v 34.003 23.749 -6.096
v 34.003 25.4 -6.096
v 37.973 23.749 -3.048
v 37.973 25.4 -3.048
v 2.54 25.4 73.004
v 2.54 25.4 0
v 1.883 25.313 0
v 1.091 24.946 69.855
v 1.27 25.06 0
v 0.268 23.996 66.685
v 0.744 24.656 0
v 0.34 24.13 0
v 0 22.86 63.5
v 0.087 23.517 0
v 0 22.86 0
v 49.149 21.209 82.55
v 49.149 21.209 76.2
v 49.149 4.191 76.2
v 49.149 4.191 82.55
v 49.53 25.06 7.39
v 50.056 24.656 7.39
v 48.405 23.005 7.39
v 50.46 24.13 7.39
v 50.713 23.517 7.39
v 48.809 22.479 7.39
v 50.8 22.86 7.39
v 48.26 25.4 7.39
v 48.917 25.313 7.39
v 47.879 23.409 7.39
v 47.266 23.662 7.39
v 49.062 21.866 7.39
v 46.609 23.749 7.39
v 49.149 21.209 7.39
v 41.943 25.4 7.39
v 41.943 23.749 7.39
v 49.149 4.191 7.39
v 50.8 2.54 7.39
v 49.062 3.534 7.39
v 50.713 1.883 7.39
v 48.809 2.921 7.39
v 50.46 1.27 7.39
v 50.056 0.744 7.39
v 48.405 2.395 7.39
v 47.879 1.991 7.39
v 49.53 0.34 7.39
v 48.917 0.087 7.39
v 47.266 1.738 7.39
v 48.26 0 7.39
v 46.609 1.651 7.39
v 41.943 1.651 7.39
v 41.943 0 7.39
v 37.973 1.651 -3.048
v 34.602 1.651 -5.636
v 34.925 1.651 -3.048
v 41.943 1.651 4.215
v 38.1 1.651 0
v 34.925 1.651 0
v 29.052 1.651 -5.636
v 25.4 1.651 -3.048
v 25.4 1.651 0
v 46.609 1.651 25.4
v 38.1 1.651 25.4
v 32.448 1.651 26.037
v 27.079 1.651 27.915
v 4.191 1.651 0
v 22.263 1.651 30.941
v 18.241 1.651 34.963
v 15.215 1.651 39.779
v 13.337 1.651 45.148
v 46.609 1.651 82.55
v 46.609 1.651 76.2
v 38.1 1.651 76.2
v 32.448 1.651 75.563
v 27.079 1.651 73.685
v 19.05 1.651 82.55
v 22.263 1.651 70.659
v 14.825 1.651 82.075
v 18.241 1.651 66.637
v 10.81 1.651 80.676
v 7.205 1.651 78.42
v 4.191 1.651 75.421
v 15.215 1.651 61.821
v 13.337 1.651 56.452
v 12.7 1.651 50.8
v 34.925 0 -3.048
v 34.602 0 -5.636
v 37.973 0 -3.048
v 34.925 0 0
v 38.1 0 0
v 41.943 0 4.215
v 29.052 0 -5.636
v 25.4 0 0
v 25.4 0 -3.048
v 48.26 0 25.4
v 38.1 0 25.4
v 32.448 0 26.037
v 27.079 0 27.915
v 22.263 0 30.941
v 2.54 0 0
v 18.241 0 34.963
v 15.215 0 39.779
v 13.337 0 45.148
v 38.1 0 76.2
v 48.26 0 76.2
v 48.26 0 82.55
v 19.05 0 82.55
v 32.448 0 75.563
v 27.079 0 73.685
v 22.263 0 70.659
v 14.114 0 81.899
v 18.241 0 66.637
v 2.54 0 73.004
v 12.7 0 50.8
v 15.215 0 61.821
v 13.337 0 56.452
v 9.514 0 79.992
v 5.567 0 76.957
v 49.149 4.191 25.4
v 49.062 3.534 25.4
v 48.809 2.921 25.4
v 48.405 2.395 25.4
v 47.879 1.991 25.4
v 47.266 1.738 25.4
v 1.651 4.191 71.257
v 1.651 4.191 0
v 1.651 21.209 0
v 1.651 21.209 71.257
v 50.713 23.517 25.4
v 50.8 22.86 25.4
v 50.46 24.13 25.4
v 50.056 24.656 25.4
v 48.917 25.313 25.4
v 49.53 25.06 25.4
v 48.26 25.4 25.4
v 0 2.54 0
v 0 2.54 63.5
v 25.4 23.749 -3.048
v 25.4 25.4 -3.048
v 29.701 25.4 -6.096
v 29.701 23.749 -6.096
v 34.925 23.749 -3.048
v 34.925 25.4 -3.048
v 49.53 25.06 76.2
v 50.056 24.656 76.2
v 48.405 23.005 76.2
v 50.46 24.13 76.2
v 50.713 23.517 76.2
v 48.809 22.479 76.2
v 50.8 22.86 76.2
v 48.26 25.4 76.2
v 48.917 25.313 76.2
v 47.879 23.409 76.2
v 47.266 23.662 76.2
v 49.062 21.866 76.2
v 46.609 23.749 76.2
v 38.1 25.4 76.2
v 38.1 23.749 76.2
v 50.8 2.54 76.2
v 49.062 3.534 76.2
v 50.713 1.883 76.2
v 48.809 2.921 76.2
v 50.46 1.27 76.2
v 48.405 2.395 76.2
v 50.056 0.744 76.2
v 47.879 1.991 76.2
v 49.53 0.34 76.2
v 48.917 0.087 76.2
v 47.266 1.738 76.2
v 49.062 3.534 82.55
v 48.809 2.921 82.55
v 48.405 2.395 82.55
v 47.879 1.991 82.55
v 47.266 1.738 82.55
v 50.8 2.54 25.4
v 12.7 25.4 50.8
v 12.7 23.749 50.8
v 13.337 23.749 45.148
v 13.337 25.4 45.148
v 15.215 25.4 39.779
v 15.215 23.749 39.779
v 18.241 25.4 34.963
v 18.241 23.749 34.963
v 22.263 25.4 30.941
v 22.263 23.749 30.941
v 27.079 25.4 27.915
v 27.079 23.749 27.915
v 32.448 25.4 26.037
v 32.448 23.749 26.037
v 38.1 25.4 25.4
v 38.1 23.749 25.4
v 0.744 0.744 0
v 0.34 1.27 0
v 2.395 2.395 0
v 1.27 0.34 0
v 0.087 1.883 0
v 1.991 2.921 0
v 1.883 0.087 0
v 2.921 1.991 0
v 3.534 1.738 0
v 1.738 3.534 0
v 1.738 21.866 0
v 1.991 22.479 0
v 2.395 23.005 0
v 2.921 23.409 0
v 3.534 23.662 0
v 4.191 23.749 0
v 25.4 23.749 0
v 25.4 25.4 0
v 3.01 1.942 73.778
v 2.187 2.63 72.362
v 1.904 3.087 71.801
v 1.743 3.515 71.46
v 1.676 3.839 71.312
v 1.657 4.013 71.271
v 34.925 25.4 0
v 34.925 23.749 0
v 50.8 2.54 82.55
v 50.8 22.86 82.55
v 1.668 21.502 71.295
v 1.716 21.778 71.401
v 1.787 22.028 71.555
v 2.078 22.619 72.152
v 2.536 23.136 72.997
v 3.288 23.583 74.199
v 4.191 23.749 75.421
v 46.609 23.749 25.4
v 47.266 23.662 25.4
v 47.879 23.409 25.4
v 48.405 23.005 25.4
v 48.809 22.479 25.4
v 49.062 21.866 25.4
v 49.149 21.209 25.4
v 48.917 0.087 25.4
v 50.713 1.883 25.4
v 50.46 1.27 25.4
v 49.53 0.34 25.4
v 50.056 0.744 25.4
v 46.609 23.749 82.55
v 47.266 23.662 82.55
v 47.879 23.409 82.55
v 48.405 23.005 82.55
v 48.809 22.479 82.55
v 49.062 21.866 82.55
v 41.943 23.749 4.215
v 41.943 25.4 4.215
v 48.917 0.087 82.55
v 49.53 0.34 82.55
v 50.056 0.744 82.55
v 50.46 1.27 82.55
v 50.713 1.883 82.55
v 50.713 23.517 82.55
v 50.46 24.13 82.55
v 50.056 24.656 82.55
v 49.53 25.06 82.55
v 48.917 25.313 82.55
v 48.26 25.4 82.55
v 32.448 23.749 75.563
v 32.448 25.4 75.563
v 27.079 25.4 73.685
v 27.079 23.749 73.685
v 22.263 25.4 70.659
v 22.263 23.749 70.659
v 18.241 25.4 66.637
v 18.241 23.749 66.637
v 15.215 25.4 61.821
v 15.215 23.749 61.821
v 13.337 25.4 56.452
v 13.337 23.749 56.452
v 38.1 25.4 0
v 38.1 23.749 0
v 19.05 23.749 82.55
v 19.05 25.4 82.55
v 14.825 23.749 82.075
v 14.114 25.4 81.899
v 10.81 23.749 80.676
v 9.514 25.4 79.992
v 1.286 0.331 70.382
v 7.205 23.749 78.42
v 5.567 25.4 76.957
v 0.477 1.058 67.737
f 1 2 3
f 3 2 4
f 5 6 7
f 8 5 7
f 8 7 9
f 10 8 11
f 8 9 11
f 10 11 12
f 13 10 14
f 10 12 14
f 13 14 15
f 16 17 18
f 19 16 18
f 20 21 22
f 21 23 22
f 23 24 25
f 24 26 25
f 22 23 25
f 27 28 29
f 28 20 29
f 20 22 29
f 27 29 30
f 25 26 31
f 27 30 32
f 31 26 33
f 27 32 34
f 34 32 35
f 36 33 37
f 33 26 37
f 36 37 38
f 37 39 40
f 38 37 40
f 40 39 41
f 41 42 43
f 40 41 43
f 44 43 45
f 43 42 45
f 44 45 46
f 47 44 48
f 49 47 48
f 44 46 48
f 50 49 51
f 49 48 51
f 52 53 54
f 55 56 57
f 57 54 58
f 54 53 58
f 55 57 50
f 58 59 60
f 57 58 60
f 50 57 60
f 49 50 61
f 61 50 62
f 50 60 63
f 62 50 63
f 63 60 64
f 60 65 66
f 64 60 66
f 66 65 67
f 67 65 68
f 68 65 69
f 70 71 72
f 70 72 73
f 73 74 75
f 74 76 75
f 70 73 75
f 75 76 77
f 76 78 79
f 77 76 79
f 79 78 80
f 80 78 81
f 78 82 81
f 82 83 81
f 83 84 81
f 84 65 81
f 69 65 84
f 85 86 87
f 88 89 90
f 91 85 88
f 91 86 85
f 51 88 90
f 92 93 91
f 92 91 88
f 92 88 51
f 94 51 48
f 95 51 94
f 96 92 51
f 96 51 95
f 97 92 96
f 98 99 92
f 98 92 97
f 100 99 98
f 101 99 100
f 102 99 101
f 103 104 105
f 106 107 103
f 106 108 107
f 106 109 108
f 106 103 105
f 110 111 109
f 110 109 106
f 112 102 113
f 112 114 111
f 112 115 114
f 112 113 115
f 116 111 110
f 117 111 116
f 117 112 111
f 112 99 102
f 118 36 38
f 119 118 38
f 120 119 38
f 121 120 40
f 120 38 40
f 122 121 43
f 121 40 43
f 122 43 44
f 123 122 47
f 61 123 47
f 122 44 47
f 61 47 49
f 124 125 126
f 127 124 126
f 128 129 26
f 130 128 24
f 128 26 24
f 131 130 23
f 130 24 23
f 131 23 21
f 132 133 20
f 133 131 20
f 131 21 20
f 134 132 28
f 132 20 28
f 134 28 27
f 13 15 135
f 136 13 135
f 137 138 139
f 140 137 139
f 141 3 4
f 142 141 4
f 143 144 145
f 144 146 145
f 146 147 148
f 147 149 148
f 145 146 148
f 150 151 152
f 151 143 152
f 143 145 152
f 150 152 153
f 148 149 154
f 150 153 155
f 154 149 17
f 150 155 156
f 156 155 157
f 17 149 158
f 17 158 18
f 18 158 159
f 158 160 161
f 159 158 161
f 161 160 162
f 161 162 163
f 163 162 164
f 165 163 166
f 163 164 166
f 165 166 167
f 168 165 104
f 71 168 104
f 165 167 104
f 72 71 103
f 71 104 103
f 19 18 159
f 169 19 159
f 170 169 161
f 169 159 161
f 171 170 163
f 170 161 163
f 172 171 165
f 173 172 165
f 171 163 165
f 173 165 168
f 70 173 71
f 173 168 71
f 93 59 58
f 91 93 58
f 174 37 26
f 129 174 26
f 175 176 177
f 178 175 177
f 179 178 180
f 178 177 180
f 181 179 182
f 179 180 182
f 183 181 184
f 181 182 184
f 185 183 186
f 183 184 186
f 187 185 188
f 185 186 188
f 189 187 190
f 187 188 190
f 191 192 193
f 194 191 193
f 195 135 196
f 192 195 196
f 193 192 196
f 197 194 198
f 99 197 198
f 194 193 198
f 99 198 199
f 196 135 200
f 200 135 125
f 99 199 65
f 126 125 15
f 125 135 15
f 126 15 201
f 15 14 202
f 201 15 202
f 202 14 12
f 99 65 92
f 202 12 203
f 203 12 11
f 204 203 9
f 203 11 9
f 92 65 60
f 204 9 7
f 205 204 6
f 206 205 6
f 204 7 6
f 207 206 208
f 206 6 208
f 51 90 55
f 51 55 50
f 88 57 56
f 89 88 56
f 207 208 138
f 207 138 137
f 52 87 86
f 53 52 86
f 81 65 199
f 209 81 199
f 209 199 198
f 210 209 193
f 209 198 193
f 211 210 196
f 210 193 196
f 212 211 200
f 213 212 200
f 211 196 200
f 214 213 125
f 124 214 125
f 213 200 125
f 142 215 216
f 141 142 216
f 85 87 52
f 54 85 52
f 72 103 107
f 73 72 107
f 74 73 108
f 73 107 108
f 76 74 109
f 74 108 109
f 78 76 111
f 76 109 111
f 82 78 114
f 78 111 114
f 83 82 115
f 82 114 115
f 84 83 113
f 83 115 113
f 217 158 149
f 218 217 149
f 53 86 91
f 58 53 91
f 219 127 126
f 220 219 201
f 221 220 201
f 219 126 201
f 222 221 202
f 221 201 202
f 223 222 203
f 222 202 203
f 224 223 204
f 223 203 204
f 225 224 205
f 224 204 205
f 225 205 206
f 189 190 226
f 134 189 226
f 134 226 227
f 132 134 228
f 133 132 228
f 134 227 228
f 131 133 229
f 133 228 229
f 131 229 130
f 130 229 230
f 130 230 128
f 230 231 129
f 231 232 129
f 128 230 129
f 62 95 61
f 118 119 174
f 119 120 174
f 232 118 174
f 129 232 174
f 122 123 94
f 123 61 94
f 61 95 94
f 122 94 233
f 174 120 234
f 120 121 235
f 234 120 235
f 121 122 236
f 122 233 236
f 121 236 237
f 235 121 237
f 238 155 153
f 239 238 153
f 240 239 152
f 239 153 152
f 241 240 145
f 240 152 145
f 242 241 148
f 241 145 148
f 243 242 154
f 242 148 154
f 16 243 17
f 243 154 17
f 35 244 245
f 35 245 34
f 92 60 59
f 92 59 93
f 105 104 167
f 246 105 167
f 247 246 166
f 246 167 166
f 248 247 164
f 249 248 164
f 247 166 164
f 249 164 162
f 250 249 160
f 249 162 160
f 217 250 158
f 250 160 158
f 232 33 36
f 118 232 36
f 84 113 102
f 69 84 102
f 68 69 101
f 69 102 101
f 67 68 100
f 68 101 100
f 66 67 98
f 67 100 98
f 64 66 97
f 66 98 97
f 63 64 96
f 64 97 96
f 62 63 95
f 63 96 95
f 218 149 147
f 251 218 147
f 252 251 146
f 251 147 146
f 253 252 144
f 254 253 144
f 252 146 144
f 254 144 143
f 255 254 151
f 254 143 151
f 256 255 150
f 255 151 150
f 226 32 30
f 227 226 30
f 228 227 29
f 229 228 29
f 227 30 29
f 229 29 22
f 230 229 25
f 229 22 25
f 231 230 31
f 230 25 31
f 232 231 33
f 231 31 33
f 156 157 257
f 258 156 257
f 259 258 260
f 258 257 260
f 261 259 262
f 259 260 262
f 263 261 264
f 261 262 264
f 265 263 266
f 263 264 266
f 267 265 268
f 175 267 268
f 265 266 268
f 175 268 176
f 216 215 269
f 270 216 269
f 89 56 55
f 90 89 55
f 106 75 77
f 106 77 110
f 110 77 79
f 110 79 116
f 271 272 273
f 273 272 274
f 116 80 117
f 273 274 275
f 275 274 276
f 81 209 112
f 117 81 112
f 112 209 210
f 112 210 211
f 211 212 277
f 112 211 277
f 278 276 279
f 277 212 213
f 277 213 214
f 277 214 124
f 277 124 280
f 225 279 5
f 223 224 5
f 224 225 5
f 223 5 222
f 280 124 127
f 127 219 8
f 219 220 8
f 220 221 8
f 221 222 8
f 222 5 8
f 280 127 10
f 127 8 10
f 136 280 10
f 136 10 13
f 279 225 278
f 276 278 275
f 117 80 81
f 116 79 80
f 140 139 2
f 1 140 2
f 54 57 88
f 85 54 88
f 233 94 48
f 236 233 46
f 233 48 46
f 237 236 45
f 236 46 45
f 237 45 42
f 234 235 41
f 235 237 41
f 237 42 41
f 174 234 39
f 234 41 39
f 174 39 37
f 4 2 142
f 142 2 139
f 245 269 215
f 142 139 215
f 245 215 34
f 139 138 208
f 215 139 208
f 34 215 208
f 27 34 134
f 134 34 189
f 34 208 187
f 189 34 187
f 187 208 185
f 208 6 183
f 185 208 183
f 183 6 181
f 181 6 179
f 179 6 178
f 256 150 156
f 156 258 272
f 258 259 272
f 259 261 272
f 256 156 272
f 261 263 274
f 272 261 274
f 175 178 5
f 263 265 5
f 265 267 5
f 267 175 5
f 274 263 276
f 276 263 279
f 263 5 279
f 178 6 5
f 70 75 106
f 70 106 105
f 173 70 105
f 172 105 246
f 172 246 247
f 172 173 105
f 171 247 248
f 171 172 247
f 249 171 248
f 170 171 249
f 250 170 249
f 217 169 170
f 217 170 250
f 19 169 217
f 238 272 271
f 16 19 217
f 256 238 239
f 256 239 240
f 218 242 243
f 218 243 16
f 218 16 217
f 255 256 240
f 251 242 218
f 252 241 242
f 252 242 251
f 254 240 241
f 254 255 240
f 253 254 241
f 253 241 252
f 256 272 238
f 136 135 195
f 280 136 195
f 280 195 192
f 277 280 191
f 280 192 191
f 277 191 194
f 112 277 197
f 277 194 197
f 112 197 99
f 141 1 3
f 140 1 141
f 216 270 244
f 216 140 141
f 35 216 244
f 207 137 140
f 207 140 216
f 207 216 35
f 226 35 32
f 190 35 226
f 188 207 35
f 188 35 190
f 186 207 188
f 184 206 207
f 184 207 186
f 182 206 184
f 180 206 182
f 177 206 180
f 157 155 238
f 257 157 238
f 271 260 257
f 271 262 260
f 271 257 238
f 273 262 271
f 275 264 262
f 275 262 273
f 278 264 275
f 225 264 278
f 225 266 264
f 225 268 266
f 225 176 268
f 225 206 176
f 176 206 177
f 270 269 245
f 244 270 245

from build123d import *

# Parameters (mm, degrees)
F1_DEPTH  = 82.55
F2_W      = 9.525
F2_H      = 1.651
F3_DEPTH  = 12.7
F4_W      = 1.651
F4_H      = 9.652
F5_DEPTH  = 3.048
F6_W      = 1.651
F6_H      = 9.652
F7_DEPTH  = 3.048
F9_DEPTH  = 6.35
F11_DEPTH = 6.35
F13_DEPTH = 3.175
F15_DEPTH = 3.175
F16_W     = 6.3165789474
F16_H     = 7.3904166929
F16_W_2   = 2.6257108653
F17_DEPTH = 31.75
F18_W     = 2.54
F18_H     = 50.8
F19_DEPTH = 27.94
F21_DEPTH = 25.4
F23_DEPTH = 25.4


with BuildPart() as f1:
    # F0 (on Top) → F1 (new body)
    with BuildSketch(Plane.XY):
        with BuildLine():
            ThreePointArc((0, 2.54), (0.7439487758, 0.7439487758), (2.54, 0))
            Line((2.54, 0), (48.26, 0))
            ThreePointArc((48.26, 0), (50.0560512242, 0.7439487758), (50.8, 2.54))
            Line((50.8, 2.54), (50.8, 22.86))
            ThreePointArc((50.8, 22.86), (50.0560512242, 24.6560512242), (48.26, 25.4))
            Line((48.26, 25.4), (2.54, 25.4))
            ThreePointArc((2.54, 25.4), (0.7439487758, 24.6560512242), (0, 22.86))
            Line((0, 22.86), (0, 2.54))
        make_face()
        with BuildLine():
            ThreePointArc((1.651, 21.209), (2.3949487758, 23.0050512242), (4.191, 23.749))
            Line((4.191, 23.749), (46.609, 23.749))
            ThreePointArc((46.609, 23.749), (48.4050512242, 23.0050512242), (49.149, 21.209))
            Line((49.149, 21.209), (49.149, 4.191))
            ThreePointArc((49.149, 4.191), (48.4050512242, 2.3949487758), (46.609, 1.651))
            Line((46.609, 1.651), (4.191, 1.651))
            ThreePointArc((4.191, 1.651), (2.3949487758, 2.3949487758), (1.651, 4.191))
            Line((1.651, 4.191), (1.651, 21.209))
        make_face(mode=Mode.SUBTRACT)
    extrude(amount=F1_DEPTH)

    # F2 (on face) → F3 (join)
    with BuildSketch(Plane(origin=(0, 0, 0), x_dir=(1, 0, 0), z_dir=(0, 0, -1))):
        with Locations((30.1625, -0.8255)):
            Rectangle(F2_W, F2_H)
        with Locations((30.1625, -24.5745)):
            Rectangle(F2_W, F2_H)
    extrude(amount=F3_DEPTH)

    # F4 (on face) → F5 (join)
    with BuildSketch(Plane.YZ.offset(34.925)):
        with Locations((0.8255, -7.874)):
            Rectangle(F4_W, F4_H)
    extrude(amount=F5_DEPTH)

    # F6 (on face) → F7 (join)
    with BuildSketch(Plane.YZ.offset(34.925)):
        with Locations((24.5745, -7.874)):
            Rectangle(F6_W, F6_H)
    extrude(amount=F7_DEPTH)

    # F8 (on face) → F9 (cut)
    with BuildSketch(Plane.XZ):
        Polygon((37.973, -12.7), (37.973, -3.048), (25.4, -12.7), align=None)
    extrude(amount=-F9_DEPTH, mode=Mode.SUBTRACT)

    # F10 (on face) → F11 (cut)
    with BuildSketch(Plane(origin=(0, 25.4, 0), x_dir=(-1, 0, 0), z_dir=(0, 1, 0))):
        Polygon((-25.4, -12.7), (-37.973, -3.048), (-37.973, -12.7), align=None)
    extrude(amount=-F11_DEPTH, mode=Mode.SUBTRACT)

    # F12 (on face) → F13 (cut)
    with BuildSketch(Plane(origin=(0, 25.4, 0), x_dir=(-1, 0, 0), z_dir=(0, 1, 0))):
        Polygon((-25.4, -6.096), (-34.0025789474, -6.096), (-25.4, -12.7), align=None)
    extrude(amount=-F13_DEPTH, mode=Mode.SUBTRACT)

    # F14 (on face) → F15 (cut)
    with BuildSketch(Plane.XZ):
        Polygon((25.4, -12.7), (34.6021804274, -5.6356998739), (25.4, -5.6356998739), align=None)
    extrude(amount=-F15_DEPTH, mode=Mode.SUBTRACT)

    # F16 (on face) → F17 (cut)
    with BuildSketch(Plane.XZ):
        with Locations((45.1017105263, 3.6952083465)):
            Rectangle(F16_W, F16_H)
        with Locations((49.5728554326, 3.6952083465)):
            Rectangle(F16_W_2, F16_H)
    extrude(amount=-F17_DEPTH, mode=Mode.SUBTRACT)

    # F18 (on face) → F19 (cut)
    with BuildSketch(Plane.XZ):
        with BuildLine():
            Line((38.1, 25.4), (48.26, 25.4))
            Line((48.26, 25.4), (48.26, 76.2))
            Line((48.26, 76.2), (38.1, 76.2))
            ThreePointArc((38.1, 76.2), (20.1394877579, 68.7605122421), (12.7, 50.8))
            ThreePointArc((12.7, 50.8), (20.1394877579, 32.8394877579), (38.1, 25.4))
        make_face()
        with Locations((49.53, 50.8)):
            Rectangle(F18_W, F18_H)
    extrude(amount=-F19_DEPTH, mode=Mode.SUBTRACT)

    # F20 (on face) → F21 (cut)
    with BuildSketch(Plane(origin=(0, 25.4, 0), x_dir=(-1, 0, 0), z_dir=(0, 1, 0))):
        Polygon((-25.4, -3.048), (-29.7012894737, -6.096), (-25.4, -6.096), align=None)
        Polygon((-41.9434210526, 0), (-38.1, 0), (-41.9434210526, 4.2154166929), align=None)
    extrude(amount=-F21_DEPTH, mode=Mode.SUBTRACT)

    # F22 (on face) → F23 (cut)
    with BuildSketch(Plane(origin=(0, 25.4, 0), x_dir=(-1, 0, 0), z_dir=(0, 1, 0))):
        with BuildLine():
            ThreePointArc((-19.05, 82.55), (-5.5796158184, 76.9703841816), (0, 63.5))
            Line((0, 63.5), (0, 82.55))
            Line((0, 82.55), (-19.05, 82.55))
        make_face()
    extrude(amount=-F23_DEPTH, mode=Mode.SUBTRACT)


solid = f1.part
